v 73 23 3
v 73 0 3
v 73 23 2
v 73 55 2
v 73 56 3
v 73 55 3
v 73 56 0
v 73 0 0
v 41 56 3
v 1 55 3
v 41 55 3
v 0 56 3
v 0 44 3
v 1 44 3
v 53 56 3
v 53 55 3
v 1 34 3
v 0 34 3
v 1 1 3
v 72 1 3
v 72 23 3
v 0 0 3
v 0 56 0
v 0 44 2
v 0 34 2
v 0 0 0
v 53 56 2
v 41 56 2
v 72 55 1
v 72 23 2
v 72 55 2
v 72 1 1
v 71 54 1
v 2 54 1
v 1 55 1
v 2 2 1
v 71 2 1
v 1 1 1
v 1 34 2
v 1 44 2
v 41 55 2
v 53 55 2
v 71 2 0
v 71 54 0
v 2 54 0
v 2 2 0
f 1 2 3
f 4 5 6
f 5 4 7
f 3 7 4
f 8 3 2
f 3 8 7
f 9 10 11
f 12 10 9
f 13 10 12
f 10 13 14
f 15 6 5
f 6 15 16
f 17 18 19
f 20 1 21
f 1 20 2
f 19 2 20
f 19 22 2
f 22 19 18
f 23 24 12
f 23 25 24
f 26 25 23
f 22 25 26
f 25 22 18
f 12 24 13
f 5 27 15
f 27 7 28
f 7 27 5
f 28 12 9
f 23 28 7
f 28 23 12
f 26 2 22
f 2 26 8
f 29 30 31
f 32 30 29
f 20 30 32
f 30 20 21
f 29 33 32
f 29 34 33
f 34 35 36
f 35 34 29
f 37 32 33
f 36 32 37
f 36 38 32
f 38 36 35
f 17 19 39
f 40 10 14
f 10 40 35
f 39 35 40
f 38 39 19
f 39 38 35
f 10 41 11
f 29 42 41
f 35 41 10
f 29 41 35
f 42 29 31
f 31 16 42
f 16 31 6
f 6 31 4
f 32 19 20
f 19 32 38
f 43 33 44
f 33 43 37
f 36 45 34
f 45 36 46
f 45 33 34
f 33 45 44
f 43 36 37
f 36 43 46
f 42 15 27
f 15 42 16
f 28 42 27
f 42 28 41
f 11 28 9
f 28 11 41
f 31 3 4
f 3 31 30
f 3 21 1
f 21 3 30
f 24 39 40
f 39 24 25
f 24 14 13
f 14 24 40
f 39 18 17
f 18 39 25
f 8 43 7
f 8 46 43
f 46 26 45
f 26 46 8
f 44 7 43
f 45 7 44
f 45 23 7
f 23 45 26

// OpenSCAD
$fn=90;

module post() {
    cylinder( d = 3.0, h = 7 );
}

module zum() {
    difference() {
        cube( [ 73, 56, 7 ] );
        translate( [ 1, 1, 5 ] ) cube( [ 71, 54, 10 ] );
        translate( [ 2, 2, 1 ] ) cube( [ 69, 52, 10 ] );
        translate( [ 41, 50, 6 ] ) cube( [ 12, 10, 10 ] );
        translate( [ 70, 23, 6 ] ) cube( [ 10, 32, 10 ] );
        translate( [ -5, 34, 6 ] ) cube( [ 10, 10, 10 ] );
    }
    cube( [  ] );
}

*zum();

difference() {
    translate( [ 0, 0, -4 ] ) zum();
    translate( [ -5, -5, -10 ] ) cube( [ 100, 100, 10 ] );
}
